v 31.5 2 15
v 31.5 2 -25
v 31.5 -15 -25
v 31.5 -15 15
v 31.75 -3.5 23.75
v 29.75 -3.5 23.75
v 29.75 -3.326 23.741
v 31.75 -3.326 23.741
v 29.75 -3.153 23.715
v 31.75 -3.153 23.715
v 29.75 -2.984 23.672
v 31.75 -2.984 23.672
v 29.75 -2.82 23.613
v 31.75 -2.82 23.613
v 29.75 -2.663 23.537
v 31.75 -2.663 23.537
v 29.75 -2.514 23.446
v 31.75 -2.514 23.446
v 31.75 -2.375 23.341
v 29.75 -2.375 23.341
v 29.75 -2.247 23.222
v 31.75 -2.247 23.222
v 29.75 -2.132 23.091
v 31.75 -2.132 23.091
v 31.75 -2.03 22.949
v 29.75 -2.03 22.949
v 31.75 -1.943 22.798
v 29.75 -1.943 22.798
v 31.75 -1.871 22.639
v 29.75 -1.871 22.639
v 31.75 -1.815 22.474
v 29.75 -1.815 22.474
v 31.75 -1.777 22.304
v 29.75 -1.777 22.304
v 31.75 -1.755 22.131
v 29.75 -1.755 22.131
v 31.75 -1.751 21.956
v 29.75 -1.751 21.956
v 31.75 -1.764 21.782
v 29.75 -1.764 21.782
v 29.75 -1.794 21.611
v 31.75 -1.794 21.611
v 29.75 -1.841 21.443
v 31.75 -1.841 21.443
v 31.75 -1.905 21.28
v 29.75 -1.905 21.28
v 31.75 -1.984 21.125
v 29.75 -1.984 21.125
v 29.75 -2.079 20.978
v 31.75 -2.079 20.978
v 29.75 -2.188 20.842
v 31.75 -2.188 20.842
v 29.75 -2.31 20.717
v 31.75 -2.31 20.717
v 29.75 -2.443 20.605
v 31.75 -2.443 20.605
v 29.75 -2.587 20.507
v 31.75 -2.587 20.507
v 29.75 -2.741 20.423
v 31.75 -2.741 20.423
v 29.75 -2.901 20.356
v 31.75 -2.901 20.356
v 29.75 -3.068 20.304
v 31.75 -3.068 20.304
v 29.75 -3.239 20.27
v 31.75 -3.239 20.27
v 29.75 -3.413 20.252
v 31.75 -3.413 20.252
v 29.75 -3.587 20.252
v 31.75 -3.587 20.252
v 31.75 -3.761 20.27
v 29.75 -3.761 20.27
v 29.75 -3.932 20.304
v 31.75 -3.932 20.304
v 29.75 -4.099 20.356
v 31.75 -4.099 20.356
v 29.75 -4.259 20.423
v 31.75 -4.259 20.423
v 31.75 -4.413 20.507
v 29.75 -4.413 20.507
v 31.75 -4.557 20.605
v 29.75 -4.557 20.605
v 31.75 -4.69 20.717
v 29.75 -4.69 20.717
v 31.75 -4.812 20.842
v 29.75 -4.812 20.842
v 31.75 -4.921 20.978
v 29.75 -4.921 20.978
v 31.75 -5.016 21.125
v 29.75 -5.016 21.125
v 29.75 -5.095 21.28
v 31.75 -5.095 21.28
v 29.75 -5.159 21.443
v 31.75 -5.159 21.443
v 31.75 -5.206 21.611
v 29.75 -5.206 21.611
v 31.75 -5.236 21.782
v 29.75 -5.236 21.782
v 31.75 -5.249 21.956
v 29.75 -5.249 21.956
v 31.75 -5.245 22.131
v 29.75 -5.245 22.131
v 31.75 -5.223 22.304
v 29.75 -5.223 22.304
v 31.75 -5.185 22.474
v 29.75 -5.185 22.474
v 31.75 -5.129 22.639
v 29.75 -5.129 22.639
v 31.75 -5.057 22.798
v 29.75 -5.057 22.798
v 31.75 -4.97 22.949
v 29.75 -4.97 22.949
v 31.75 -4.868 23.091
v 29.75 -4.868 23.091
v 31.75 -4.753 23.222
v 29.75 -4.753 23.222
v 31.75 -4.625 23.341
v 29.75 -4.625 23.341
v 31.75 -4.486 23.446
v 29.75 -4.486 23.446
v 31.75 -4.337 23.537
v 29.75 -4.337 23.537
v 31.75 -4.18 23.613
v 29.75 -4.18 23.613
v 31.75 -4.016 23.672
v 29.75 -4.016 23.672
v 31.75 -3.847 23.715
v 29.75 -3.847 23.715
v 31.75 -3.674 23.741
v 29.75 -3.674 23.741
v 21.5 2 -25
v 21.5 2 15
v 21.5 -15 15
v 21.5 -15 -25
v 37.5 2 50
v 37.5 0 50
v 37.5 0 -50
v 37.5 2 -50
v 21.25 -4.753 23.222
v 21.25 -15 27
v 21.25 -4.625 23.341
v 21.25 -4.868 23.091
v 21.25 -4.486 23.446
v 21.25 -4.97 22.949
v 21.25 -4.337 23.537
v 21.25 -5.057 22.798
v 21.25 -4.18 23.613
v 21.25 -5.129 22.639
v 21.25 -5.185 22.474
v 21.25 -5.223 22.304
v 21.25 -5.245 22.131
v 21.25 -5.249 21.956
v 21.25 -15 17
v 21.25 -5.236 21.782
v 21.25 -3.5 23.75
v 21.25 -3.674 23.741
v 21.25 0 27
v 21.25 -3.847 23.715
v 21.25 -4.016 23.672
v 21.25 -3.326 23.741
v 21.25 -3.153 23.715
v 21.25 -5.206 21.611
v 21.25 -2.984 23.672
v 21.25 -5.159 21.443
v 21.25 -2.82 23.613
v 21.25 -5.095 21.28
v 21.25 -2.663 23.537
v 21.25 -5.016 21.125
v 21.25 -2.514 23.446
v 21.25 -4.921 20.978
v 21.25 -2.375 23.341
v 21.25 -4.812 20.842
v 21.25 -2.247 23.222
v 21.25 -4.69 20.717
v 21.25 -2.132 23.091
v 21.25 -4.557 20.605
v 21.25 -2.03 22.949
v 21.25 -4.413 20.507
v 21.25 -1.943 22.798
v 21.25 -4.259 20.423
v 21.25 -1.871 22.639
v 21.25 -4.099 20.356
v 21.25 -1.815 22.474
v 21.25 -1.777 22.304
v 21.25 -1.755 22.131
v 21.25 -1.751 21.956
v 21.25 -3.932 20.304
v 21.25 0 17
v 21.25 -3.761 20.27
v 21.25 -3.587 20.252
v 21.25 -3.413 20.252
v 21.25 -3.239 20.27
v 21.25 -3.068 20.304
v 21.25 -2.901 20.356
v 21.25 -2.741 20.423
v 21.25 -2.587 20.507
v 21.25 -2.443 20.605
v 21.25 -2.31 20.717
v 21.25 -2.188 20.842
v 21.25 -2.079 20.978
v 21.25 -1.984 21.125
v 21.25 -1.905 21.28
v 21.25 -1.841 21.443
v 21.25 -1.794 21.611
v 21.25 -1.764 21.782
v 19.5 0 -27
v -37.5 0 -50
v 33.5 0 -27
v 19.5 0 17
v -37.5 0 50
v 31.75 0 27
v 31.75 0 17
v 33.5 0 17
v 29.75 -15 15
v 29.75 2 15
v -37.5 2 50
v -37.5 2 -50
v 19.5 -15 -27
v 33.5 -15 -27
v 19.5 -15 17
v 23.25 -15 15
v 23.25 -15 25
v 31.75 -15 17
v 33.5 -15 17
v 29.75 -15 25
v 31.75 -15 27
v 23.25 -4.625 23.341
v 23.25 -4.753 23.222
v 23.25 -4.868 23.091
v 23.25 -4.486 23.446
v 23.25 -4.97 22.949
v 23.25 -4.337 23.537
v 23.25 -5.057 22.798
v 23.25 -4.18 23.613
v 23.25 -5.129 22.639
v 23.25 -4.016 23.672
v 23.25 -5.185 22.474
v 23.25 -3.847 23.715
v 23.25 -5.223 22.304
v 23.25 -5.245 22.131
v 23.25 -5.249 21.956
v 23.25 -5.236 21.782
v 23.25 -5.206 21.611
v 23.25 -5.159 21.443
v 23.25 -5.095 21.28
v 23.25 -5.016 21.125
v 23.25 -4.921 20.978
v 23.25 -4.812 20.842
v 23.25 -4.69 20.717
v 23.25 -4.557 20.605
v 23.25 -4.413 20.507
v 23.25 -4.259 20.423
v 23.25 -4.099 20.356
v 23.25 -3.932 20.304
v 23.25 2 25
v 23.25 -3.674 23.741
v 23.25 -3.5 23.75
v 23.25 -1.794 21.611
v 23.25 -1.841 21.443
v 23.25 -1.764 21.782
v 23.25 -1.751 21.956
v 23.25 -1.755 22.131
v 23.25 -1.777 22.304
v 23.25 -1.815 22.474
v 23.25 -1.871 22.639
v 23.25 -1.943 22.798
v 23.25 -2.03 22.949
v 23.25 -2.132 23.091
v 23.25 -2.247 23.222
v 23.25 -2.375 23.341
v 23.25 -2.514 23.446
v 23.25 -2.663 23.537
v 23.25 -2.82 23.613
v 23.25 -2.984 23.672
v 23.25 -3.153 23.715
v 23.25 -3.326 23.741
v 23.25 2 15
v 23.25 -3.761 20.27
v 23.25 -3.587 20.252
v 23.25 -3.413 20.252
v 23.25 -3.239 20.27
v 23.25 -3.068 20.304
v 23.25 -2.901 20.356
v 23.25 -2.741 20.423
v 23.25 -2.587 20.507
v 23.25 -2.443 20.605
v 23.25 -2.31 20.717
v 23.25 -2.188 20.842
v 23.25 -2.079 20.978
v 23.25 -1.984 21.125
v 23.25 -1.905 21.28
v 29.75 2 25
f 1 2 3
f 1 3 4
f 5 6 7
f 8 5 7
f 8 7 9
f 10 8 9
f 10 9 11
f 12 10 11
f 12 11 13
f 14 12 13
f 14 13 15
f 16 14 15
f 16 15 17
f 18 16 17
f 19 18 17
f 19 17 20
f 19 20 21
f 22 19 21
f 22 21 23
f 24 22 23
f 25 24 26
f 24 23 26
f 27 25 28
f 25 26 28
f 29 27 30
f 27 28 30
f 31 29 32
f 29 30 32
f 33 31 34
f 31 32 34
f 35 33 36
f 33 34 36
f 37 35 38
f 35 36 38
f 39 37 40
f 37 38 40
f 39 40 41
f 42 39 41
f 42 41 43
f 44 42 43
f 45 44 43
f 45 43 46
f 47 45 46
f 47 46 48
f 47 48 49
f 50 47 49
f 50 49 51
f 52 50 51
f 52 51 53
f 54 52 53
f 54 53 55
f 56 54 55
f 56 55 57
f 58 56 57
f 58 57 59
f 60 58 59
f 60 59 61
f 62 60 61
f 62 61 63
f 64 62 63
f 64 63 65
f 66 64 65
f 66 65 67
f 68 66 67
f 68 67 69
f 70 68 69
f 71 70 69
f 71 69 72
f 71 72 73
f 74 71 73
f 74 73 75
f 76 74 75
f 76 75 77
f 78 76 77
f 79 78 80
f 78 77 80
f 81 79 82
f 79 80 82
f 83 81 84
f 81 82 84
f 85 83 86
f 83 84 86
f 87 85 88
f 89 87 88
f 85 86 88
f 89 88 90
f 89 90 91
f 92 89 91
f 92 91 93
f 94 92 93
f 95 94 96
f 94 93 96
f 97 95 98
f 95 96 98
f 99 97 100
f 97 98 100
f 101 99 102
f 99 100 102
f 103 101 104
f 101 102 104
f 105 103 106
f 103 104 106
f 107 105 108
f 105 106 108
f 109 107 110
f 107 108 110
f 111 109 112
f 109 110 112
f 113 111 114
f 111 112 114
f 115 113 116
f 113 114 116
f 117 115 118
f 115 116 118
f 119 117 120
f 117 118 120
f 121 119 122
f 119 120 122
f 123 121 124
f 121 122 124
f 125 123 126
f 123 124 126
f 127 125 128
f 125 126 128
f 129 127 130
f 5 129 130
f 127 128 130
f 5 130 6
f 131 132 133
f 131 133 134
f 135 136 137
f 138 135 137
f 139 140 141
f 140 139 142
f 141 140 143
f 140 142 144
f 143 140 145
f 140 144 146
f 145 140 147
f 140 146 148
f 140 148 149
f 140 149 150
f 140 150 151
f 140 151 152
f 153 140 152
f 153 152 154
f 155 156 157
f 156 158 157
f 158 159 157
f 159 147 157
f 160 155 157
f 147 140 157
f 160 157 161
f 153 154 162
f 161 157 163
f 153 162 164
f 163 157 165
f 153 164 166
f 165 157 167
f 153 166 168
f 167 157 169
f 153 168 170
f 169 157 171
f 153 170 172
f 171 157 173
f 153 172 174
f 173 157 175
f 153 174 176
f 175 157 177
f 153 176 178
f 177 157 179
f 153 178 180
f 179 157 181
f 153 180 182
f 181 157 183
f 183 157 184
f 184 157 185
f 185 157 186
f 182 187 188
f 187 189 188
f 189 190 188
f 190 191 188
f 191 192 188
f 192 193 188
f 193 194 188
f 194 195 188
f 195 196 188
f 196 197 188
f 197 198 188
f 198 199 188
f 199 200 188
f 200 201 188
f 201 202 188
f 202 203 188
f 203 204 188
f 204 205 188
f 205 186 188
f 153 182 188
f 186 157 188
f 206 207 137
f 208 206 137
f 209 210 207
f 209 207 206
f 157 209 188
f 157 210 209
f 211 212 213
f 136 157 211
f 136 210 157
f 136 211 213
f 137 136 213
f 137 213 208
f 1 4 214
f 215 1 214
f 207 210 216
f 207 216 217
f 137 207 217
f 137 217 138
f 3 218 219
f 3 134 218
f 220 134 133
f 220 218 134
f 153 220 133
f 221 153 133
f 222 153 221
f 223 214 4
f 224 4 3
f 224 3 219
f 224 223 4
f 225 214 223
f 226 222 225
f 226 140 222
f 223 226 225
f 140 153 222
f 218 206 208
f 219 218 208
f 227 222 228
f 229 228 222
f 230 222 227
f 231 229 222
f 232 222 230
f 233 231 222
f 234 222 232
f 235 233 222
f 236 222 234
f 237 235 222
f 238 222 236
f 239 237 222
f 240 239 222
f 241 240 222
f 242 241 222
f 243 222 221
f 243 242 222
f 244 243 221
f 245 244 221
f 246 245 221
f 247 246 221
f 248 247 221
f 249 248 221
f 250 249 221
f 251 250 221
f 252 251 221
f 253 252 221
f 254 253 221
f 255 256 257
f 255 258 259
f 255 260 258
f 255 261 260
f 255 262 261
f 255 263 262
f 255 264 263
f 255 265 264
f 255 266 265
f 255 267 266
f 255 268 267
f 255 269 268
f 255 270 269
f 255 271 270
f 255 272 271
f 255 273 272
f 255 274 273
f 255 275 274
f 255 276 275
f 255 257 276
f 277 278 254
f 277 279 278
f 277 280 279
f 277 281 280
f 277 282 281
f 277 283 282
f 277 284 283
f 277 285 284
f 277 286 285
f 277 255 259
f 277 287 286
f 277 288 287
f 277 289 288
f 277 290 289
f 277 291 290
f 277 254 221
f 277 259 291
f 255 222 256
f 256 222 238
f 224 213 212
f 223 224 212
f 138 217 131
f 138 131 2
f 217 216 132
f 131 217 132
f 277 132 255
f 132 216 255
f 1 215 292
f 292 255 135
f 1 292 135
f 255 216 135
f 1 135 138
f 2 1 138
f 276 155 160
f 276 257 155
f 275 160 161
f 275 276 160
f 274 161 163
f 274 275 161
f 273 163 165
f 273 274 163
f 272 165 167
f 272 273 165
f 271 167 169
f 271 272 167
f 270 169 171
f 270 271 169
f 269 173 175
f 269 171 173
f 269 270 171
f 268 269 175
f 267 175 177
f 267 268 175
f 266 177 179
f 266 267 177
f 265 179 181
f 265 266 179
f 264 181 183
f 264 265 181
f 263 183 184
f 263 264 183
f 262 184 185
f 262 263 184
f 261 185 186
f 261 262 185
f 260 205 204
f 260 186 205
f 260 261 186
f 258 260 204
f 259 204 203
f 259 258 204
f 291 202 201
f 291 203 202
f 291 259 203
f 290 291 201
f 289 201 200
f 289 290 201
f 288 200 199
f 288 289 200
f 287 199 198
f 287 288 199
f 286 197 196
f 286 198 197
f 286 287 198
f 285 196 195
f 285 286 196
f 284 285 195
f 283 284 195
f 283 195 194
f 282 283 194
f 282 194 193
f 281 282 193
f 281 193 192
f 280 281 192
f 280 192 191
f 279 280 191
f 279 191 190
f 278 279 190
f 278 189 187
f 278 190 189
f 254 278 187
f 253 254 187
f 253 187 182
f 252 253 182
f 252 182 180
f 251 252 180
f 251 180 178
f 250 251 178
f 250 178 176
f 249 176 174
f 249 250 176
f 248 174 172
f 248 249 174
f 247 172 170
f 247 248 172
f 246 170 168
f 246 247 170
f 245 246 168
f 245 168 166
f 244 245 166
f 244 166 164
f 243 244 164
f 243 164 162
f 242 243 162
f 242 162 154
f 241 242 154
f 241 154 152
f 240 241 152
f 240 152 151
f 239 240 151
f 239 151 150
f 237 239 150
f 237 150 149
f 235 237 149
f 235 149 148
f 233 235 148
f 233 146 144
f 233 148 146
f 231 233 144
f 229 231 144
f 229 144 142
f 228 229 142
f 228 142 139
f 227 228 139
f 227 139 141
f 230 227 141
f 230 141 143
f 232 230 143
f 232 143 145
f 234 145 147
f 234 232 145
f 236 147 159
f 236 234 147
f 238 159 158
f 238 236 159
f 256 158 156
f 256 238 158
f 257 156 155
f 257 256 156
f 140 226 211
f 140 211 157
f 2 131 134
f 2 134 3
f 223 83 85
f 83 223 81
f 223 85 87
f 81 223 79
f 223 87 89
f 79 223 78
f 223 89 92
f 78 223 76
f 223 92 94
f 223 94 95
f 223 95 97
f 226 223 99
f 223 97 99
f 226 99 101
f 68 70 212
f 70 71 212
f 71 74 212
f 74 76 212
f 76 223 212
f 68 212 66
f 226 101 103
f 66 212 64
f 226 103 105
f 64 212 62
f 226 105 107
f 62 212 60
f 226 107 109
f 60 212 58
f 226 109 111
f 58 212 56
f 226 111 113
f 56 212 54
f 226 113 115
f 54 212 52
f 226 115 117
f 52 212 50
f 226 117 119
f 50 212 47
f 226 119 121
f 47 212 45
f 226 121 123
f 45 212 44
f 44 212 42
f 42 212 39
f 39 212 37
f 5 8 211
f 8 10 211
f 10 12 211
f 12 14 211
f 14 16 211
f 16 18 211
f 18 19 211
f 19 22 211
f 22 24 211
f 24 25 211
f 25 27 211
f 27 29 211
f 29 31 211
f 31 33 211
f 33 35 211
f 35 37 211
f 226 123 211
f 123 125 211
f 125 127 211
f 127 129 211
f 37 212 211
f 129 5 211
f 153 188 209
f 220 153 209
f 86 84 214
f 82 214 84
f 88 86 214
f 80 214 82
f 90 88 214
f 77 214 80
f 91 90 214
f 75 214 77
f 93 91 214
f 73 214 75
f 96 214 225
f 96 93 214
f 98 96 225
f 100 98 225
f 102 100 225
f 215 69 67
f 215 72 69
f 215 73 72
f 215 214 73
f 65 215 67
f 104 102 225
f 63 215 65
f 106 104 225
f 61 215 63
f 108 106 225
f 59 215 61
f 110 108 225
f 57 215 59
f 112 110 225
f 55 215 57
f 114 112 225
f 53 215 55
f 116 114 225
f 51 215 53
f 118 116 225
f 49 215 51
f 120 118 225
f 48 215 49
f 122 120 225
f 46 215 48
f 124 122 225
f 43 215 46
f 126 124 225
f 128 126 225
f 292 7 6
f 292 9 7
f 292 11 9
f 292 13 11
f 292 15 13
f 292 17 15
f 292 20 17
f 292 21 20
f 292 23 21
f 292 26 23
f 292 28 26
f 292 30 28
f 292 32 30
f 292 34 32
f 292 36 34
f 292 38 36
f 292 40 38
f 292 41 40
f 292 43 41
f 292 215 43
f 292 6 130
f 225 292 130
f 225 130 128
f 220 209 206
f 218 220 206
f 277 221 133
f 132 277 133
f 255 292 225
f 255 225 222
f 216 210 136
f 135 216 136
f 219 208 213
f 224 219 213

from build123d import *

# Parameters (mm, degrees)
SKETCH1_W               = 75
SKETCH1_H               = 100
BOSS_EXTRUDE1_DEPTH     = 2
CUT_EXTRUDE1_REACH      = 4
SKETCH2_W               = 10
SKETCH2_H               = 50
SKETCH3_W               = 1.75
SKETCH3_H               = 10
BOSS_EXTRUDE2_DEPTH     = 2
BOSS_EXTRUDE3_DEPTH     = 15
SKETCH5_R               = 1.75
CUT_EXTRUDE2_DEPTH      = 65
CUT_EXTRUDE2_DEPTH_BACK = 12


with BuildPart() as part:
    # Sketch1 → Boss-Extrude1 (new body)
    with BuildSketch(Plane(origin=(0, 0, 0), x_dir=(1, 0, 0), z_dir=(0, 1, 0))):
        Rectangle(SKETCH1_W, SKETCH1_H)
    extrude(amount=BOSS_EXTRUDE1_DEPTH)

    # Sketch2 → Cut-Extrude1 (cut, up to next)
    with BuildSketch(Plane(origin=(0, 2, 0), x_dir=(1, 0, 0), z_dir=(0, 1, 0)), mode=Mode.PRIVATE) as cut_extrude1_sk1:
        with Locations((26.5, 0)):
            Rectangle(SKETCH2_W, SKETCH2_H)
    cut_extrude1_tool1 = extrude(cut_extrude1_sk1.sketch, amount=-CUT_EXTRUDE1_REACH, mode=Mode.PRIVATE) & part.part
    add(cut_extrude1_tool1.solids().sort_by_distance((26.5, 2, 0))[0], mode=Mode.SUBTRACT)

    # Sketch3 → Boss-Extrude2 (add)
    with BuildSketch(Plane.XZ):
        with Locations((22.375, 20)):
            Rectangle(SKETCH3_W, SKETCH3_H)
        with Locations((30.625, 20)):
            Rectangle(SKETCH3_W, SKETCH3_H)
    extrude(amount=-BOSS_EXTRUDE2_DEPTH)

    # Sketch4 → Boss-Extrude3 (add)
    with BuildSketch(Plane.XZ):
        Polygon((33.5, 17), (31.75, 17), (31.75, 27), (21.25, 27), (21.25, 17), (19.5, 17), (19.5, -27), (33.5, -27), align=None)
        Polygon((31.5, 15), (29.75, 15), (29.75, 25), (23.25, 25), (23.25, 15), (21.5, 15), (21.5, -25), (31.5, -25), align=None, mode=Mode.SUBTRACT)
    extrude(amount=BOSS_EXTRUDE3_DEPTH)

    # Sketch5 → Cut-Extrude2 (cut, two sides)
    with BuildSketch(Plane.ZY.offset(-26.5)) as cut_extrude2_sk:
        with Locations((22, -3.5)):
            Circle(SKETCH5_R)
    extrude(amount=CUT_EXTRUDE2_DEPTH, mode=Mode.SUBTRACT)
    extrude(cut_extrude2_sk.sketch, amount=-CUT_EXTRUDE2_DEPTH_BACK, mode=Mode.SUBTRACT)


solid = part.part
